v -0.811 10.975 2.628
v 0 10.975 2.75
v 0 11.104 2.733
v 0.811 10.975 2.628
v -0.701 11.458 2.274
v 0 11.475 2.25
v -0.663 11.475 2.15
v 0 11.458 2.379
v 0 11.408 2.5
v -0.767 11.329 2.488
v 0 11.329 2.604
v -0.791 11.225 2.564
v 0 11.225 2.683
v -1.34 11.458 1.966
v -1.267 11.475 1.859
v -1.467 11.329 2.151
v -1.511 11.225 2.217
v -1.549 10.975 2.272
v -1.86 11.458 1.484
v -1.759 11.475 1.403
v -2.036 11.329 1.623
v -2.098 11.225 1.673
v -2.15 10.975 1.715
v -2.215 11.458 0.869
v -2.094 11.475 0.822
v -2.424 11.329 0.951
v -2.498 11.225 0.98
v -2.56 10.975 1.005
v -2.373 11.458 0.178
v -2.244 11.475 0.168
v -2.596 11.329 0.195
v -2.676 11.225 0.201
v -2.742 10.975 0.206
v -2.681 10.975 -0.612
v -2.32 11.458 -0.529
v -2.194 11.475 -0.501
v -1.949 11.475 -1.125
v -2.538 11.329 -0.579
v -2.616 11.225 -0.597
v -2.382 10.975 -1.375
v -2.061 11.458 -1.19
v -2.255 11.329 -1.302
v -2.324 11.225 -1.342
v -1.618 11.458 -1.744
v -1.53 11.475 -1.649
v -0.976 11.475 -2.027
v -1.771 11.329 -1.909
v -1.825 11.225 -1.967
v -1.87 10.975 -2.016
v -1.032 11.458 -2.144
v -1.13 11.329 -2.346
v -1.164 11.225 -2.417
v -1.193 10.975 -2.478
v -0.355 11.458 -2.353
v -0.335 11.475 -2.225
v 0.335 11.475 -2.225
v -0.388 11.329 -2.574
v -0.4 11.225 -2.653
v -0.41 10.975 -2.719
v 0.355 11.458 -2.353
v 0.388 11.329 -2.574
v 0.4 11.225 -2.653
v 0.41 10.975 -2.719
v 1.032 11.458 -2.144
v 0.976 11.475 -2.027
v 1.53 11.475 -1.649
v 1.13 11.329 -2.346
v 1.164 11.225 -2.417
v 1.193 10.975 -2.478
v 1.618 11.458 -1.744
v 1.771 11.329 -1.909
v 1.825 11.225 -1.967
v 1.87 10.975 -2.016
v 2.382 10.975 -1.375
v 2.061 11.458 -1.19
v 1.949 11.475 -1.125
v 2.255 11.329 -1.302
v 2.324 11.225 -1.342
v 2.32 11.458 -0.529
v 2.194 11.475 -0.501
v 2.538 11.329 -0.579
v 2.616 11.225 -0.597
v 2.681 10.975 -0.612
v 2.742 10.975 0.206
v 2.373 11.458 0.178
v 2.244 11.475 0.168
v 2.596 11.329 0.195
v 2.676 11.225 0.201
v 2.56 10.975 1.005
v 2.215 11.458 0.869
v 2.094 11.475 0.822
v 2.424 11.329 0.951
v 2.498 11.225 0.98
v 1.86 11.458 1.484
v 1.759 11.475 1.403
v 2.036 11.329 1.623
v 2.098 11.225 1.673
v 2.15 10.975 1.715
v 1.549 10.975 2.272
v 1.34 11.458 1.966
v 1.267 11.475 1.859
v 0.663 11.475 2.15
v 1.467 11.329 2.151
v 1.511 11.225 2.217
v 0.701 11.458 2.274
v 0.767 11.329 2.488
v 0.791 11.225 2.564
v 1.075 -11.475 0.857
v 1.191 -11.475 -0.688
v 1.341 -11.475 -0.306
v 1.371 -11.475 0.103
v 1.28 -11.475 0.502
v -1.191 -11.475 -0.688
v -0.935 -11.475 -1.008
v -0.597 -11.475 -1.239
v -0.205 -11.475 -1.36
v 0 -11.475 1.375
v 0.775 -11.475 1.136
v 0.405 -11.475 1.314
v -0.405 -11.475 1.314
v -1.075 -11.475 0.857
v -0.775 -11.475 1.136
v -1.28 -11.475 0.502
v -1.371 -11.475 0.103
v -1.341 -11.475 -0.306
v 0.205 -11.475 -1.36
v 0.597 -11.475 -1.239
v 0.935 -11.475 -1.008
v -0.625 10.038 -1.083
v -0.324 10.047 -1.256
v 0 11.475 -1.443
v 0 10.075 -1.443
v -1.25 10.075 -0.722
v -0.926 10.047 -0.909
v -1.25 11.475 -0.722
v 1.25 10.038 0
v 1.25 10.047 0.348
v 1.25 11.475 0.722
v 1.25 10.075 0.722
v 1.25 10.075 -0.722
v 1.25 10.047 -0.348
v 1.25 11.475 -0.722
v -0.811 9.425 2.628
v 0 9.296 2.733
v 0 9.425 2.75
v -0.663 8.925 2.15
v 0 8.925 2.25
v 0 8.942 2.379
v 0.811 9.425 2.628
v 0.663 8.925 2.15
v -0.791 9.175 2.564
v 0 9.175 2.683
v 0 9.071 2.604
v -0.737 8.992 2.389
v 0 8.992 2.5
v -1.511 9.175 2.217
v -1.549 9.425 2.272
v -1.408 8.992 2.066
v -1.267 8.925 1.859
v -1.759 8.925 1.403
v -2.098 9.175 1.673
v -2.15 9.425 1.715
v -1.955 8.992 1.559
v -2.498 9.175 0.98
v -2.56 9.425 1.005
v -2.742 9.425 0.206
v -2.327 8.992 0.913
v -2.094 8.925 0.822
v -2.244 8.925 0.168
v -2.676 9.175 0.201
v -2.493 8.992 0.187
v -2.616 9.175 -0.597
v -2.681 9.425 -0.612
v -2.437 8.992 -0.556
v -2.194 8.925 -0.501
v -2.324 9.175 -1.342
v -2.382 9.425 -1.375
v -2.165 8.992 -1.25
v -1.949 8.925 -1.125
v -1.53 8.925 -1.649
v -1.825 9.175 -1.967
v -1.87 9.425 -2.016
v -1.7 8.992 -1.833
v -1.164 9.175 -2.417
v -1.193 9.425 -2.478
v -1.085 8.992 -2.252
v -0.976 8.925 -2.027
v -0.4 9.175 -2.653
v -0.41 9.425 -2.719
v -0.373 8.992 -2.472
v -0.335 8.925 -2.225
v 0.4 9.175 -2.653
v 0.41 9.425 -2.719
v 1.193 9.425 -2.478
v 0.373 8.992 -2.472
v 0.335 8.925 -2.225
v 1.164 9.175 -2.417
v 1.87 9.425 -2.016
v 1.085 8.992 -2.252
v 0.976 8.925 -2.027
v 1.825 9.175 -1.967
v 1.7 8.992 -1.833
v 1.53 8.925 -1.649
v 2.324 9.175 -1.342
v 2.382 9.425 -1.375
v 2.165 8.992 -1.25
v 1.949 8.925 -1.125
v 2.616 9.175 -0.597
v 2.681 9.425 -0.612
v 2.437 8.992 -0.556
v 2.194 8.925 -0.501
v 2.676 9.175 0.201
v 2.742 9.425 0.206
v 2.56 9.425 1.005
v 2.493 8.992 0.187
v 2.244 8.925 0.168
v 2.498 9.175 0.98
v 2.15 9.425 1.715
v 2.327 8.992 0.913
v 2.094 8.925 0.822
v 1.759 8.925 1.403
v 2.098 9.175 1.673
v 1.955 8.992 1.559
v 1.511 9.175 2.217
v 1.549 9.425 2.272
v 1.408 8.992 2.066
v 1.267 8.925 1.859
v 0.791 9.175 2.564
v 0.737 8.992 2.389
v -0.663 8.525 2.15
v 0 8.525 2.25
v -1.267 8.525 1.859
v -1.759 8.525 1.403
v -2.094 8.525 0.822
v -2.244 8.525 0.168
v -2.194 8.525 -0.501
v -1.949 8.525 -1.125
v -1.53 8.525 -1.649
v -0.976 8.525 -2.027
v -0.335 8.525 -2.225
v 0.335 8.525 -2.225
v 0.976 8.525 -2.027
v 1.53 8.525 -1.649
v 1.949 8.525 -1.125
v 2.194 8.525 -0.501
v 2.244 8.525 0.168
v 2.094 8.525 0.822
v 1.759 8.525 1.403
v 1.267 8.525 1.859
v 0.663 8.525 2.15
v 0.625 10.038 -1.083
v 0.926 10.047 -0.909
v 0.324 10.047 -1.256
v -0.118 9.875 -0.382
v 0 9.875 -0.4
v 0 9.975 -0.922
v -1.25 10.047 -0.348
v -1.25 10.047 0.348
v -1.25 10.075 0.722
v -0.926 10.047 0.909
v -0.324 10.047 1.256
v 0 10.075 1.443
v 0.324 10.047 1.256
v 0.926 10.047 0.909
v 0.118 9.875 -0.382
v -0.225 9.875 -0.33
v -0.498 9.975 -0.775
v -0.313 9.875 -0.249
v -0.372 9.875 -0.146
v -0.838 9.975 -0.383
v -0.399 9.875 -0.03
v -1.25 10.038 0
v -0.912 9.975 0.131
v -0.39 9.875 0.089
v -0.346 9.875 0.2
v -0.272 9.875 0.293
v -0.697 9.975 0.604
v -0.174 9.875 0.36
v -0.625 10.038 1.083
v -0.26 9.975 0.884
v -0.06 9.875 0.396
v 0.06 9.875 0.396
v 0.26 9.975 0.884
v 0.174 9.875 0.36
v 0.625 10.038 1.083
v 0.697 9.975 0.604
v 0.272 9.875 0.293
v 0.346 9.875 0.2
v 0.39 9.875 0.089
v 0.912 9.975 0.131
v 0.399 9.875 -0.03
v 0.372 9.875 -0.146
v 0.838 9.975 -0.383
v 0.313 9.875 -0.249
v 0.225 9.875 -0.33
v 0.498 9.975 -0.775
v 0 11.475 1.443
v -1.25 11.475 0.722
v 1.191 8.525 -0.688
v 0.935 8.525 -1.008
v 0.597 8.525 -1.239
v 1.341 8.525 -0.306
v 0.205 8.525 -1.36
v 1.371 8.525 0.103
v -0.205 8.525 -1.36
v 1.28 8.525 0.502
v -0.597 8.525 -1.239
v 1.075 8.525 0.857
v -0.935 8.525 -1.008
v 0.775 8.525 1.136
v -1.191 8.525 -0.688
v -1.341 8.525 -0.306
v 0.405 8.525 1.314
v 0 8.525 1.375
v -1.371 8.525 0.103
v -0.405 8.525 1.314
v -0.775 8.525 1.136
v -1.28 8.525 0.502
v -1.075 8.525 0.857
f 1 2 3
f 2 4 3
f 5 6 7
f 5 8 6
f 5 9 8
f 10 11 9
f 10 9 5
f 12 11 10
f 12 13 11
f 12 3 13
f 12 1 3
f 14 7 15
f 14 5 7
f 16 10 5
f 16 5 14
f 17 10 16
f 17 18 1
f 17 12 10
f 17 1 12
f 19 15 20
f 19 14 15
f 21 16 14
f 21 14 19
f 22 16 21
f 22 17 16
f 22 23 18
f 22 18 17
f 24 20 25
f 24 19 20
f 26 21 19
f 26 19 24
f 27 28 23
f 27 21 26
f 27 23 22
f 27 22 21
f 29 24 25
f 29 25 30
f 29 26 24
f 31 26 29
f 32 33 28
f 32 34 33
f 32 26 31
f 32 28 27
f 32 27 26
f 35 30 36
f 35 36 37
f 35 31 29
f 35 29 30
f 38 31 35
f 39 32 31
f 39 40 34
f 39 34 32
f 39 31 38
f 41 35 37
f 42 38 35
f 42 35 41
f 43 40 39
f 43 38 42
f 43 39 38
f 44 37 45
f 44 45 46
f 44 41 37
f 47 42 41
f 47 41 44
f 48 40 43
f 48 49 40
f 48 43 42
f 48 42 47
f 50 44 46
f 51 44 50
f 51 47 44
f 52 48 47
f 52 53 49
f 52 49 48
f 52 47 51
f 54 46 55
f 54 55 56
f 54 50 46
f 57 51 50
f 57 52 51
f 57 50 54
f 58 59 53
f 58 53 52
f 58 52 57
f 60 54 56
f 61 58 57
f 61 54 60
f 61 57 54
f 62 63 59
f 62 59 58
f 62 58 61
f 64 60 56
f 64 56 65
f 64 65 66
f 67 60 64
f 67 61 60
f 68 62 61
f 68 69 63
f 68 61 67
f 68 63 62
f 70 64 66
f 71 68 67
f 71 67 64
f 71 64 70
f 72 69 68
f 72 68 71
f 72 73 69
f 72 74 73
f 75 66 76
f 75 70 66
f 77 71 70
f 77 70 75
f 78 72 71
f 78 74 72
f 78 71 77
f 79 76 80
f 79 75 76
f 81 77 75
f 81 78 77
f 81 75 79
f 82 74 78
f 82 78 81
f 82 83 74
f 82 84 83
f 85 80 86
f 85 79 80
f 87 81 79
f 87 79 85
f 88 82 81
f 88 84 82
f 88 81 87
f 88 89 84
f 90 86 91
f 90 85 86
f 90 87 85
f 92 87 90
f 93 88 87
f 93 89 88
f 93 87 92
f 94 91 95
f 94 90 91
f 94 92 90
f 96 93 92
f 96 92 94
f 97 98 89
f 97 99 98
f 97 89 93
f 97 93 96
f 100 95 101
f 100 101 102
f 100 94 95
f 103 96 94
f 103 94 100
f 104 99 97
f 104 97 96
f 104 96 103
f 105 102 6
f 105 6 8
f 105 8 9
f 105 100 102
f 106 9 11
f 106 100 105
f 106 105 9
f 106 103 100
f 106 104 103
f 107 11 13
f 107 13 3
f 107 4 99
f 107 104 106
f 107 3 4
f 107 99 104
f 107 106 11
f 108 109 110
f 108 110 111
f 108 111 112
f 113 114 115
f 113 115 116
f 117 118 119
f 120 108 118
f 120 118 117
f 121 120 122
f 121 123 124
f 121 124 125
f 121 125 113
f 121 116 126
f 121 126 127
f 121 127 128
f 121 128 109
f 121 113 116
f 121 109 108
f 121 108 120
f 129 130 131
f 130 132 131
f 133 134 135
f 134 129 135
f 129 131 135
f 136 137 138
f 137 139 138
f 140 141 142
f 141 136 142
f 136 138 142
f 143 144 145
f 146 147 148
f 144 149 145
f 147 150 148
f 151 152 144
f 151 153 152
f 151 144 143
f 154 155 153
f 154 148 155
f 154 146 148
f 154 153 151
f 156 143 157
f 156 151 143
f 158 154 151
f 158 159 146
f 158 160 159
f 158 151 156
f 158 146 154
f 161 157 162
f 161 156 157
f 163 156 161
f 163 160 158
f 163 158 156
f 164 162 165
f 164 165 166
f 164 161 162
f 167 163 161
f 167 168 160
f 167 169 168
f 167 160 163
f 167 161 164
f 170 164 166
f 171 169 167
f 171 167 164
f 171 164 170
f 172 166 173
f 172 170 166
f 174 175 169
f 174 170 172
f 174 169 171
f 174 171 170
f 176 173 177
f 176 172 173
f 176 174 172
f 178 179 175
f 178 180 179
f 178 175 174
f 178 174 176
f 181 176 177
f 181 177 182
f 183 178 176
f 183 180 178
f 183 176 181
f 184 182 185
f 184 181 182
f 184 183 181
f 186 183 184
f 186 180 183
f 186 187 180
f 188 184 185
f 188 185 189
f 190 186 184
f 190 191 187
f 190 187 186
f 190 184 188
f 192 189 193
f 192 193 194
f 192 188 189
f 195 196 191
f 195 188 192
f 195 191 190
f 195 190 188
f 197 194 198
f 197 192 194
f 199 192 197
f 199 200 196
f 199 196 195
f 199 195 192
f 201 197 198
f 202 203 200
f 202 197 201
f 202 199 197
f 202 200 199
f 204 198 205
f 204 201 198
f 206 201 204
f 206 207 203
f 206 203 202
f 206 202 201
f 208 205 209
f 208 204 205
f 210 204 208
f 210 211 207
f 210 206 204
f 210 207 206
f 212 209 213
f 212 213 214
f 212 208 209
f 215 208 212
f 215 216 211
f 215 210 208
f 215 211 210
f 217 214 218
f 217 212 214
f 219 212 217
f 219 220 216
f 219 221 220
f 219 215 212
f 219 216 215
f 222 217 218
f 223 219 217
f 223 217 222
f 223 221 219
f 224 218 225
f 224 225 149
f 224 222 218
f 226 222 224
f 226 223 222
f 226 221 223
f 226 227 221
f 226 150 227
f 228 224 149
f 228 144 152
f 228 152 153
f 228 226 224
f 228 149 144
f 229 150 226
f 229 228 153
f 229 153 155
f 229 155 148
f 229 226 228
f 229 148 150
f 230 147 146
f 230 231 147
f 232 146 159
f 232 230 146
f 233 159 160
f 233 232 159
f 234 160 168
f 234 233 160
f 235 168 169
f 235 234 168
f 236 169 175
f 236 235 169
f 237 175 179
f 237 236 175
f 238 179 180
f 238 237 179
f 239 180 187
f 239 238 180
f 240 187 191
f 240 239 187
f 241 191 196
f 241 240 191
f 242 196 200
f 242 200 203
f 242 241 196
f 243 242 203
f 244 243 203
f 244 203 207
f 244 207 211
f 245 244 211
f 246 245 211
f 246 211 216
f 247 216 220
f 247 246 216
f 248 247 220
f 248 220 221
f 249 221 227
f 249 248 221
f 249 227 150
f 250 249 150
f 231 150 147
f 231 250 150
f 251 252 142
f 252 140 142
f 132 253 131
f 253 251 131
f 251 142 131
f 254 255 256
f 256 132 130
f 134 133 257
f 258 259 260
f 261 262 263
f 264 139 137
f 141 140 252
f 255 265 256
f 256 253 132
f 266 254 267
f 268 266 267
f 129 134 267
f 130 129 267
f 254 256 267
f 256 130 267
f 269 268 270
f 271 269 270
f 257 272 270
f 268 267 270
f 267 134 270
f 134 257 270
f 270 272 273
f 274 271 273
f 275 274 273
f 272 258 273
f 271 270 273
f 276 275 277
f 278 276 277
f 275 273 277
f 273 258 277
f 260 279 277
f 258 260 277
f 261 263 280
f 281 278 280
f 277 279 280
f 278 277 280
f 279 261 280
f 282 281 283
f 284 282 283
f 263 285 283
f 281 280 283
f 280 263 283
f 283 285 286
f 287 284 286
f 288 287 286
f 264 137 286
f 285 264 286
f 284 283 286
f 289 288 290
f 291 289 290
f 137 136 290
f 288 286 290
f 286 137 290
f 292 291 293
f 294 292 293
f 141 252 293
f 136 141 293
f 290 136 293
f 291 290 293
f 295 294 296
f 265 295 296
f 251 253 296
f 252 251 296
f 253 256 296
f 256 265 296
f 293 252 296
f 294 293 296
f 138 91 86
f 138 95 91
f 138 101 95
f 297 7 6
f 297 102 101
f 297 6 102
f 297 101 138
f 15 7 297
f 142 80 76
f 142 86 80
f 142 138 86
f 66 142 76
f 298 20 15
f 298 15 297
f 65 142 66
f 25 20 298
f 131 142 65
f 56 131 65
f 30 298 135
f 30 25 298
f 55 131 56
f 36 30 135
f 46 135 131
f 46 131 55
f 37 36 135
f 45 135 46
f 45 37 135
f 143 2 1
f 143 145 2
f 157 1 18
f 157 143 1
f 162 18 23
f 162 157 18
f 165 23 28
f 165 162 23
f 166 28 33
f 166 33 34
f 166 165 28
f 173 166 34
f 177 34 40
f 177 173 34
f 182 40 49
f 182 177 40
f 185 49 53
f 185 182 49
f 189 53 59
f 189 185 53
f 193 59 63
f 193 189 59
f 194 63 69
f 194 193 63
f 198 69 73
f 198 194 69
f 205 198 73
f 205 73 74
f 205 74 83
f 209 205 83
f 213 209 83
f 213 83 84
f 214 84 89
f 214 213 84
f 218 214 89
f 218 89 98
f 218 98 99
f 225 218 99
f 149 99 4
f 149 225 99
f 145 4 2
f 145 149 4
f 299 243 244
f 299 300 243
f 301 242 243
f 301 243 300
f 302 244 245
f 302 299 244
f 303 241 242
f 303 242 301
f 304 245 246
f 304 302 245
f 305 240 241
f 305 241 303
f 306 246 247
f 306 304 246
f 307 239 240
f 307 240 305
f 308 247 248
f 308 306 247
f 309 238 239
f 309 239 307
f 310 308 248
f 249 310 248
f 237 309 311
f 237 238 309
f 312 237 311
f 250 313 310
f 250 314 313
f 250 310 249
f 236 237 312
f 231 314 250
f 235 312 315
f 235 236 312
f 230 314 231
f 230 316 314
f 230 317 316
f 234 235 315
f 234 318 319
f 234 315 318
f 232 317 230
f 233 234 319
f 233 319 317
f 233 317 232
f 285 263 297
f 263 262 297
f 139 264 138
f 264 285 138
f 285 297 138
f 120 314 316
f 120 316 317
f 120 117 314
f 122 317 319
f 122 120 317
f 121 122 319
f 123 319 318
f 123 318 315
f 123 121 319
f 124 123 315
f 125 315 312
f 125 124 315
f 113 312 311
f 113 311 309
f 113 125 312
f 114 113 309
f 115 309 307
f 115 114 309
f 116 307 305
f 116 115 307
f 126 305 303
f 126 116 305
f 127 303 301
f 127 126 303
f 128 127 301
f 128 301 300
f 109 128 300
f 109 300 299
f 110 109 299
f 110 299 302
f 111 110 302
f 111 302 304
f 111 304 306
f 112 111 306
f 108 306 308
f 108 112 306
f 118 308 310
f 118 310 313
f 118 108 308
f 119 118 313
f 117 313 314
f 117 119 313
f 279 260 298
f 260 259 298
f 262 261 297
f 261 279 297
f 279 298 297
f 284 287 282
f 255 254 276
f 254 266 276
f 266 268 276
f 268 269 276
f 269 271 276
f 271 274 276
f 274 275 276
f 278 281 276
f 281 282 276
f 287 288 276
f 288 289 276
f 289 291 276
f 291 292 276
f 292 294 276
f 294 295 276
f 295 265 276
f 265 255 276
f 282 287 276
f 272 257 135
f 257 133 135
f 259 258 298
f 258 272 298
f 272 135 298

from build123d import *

# Parameters (mm, degrees)
BOSS_EXTRUDE1_DEPTH = 2


with BuildPart() as part:
    # Sketch1 → Revolve1 (revolve)
    with BuildSketch(Plane.XY):
        with BuildLine():
            Line((0, 11.475), (2.25, 11.475))
            ThreePointArc((2.25, 11.475), (2.603553391, 11.328553391), (2.75, 10.975))
            Line((2.75, 10.975), (2.75, 9.425))
            ThreePointArc((2.75, 9.425), (2.603553391, 9.071446609), (2.25, 8.925))
            Line((2.25, 8.925), (2.25, 8.525))
            Line((2.25, 8.525), (1.375, 8.525))
            Line((1.375, 8.525), (1.375, -11.475))
            Line((1.375, -11.475), (0, -11.475))
            Line((0, -11.475), (0, 11.475))
        make_face()
    revolve(axis=Axis((0, 4.094224924, 0), (0, -1, 0)))


with BuildPart() as body_2:
    # Sketch2 → Boss-Extrude1 (new body)
    with BuildSketch(Plane(origin=(0, 11.475, 0), x_dir=(1, 0, 0), z_dir=(0, 1, 0))):
        Polygon((0, 1.443375673), (-1.25, 0.721687836), (-1.25, -0.721687836), (0, -1.443375673), (1.25, -0.721687836), (1.25, 0.721687836), align=None)
    extrude(amount=-BOSS_EXTRUDE1_DEPTH)

    # Sketch3 → Cut-Revolve1 (revolve, cut)
    with BuildSketch(Plane(origin=(0, 0, 0), x_dir=(0, 0, -1), z_dir=(1, 0, 0))):
        Polygon((0, 9.875), (0.4, 9.875), (1.443375673, 10.075), (1.443375673, 9.475), (0, 9.475), align=None)
    revolve(axis=Axis((0, 9.475, 0), (0, 1, 0)), mode=Mode.SUBTRACT)


with BuildPart() as part_1:
    add(part.part)

    # Combine1: cut body 2
    add(body_2.part, mode=Mode.SUBTRACT)


solid = part_1.part
